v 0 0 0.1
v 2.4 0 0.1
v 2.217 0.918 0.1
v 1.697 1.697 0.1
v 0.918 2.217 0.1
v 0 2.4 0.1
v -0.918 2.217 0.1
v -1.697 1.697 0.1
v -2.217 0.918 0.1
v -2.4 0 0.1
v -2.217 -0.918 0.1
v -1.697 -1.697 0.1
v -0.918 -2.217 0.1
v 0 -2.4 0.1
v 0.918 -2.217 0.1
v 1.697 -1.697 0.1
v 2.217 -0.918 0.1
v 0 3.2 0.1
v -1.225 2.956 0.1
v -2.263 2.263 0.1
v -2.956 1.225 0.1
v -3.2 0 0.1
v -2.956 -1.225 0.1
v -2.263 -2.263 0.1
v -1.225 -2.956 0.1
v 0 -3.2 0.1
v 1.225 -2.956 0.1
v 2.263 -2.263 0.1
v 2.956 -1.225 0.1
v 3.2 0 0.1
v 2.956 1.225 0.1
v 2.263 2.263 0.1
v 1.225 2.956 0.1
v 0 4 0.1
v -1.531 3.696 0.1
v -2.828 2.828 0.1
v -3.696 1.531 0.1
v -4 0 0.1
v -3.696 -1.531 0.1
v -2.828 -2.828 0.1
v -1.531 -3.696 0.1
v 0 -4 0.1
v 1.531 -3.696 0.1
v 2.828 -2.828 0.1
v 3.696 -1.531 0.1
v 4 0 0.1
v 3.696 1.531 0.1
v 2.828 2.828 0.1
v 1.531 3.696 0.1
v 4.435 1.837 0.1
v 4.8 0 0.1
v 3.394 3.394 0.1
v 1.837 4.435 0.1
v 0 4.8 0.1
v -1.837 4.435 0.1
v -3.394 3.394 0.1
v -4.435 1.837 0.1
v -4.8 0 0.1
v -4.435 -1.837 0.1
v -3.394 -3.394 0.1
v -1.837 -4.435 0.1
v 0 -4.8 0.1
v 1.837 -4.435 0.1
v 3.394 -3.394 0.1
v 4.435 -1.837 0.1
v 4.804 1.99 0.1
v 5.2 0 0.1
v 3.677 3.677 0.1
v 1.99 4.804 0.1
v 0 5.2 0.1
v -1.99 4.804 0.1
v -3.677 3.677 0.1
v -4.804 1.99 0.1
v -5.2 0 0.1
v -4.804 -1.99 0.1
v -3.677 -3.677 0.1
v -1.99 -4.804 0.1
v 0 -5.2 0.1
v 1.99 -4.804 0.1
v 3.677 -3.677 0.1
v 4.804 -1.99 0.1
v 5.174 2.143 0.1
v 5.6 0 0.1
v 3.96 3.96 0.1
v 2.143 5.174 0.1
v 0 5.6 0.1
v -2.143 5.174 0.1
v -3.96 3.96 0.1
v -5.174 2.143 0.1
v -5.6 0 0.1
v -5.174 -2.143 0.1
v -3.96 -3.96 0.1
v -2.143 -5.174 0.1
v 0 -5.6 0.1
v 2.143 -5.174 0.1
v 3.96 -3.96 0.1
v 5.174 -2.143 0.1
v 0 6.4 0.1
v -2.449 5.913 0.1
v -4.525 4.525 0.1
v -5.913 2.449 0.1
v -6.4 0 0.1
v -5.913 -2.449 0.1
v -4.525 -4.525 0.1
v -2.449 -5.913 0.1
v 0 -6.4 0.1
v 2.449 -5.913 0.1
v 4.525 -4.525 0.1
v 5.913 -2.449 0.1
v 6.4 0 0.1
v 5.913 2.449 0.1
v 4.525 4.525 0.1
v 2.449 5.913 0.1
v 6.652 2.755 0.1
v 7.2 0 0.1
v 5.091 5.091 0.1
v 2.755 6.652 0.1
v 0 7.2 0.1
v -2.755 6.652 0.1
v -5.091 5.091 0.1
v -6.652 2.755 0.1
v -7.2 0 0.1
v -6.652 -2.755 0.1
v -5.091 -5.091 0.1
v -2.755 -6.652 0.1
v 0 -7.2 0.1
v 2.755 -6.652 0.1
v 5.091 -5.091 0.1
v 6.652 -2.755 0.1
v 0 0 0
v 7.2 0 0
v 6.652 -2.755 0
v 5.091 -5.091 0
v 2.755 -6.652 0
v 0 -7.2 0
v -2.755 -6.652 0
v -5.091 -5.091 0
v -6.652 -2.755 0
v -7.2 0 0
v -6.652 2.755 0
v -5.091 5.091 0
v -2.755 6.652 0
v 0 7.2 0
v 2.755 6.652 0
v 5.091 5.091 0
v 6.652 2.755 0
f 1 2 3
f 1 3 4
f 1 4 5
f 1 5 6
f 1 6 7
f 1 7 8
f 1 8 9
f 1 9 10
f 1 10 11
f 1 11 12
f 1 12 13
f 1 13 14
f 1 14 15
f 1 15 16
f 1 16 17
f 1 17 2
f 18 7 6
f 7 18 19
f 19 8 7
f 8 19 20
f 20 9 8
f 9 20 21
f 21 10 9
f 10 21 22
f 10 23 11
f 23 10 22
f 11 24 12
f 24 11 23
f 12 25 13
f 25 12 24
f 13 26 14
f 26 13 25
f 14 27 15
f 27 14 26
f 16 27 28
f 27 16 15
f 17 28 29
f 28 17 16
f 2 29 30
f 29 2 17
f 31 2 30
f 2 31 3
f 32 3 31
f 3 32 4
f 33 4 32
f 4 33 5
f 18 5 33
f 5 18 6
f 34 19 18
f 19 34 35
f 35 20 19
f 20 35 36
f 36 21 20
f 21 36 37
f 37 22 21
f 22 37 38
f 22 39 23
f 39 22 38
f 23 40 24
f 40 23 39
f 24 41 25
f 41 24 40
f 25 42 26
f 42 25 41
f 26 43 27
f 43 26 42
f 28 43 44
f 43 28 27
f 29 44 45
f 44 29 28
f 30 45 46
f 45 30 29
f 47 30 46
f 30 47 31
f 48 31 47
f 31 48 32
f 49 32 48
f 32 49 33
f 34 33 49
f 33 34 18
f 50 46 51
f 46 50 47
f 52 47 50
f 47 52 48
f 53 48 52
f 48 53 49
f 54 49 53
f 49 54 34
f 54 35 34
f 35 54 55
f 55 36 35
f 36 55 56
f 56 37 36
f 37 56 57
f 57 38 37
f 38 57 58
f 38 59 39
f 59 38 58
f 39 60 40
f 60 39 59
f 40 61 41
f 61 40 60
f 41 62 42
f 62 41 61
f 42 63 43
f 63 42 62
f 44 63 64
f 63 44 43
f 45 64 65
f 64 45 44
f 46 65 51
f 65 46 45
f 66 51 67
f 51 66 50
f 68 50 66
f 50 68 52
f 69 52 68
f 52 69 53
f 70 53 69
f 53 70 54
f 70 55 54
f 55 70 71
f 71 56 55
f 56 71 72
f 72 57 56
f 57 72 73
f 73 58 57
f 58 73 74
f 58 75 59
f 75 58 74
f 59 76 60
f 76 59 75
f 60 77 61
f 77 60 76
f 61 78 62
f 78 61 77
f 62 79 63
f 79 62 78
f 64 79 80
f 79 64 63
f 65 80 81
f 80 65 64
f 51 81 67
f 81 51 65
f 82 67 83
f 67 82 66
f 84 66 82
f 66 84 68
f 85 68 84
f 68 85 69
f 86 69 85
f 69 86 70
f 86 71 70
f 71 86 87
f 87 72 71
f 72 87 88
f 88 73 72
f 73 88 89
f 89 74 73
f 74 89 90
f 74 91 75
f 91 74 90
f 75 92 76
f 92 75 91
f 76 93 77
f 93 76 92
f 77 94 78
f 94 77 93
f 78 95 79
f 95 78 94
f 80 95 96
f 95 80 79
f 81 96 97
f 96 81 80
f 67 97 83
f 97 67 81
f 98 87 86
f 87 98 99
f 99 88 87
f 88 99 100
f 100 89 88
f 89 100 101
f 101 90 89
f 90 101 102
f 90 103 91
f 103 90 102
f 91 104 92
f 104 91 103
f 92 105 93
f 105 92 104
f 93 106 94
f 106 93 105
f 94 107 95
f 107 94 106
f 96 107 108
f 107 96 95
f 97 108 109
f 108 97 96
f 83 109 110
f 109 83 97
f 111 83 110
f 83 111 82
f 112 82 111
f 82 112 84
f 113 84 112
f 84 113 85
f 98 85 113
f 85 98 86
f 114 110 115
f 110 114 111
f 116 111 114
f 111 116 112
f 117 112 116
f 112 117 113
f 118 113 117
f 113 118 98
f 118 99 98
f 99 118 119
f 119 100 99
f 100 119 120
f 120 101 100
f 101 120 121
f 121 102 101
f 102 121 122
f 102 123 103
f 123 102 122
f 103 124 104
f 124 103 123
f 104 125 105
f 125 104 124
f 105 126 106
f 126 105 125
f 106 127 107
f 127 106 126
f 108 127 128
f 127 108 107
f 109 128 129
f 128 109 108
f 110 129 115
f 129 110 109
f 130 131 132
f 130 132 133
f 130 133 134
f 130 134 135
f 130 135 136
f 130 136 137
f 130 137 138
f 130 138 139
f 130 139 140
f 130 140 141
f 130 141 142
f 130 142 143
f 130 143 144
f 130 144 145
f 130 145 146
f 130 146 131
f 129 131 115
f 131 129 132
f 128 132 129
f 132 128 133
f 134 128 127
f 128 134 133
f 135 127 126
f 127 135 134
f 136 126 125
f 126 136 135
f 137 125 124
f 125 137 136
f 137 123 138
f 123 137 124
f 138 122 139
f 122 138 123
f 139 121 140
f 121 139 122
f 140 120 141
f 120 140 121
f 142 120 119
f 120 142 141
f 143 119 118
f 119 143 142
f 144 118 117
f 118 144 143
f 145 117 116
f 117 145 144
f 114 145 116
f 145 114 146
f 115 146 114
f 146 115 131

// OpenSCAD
// file: ../p/4-4cyli.scad
use <../lib.scad>
function ldraw_lib__4_4cyli() = [
// 0 Cylinder 1.0
// 0 Name: 4-4cyli.dat
// 0 Author: James Jessiman
// 0 !LDRAW_ORG Primitive UPDATE 2005-01
// 0 !LICENSE Licensed under CC BY 4.0 : see CAreadme.txt
// 
// 0 BFC CERTIFY CCW
  [0,"BFC","CERTIFY"],
  [0,"BFC","CCW"],
// 
// 0 !HISTORY 1998-12-15 [PTadmin] Official Update 1998-10
// 0 !HISTORY 2002-03-23 [sbliss] Added BFC statement; merged headers from files in distributions LDraw 0.27 and Complete.
// 0 !HISTORY 2002-04-25 [PTadmin] Official Update 2002-02
// 0 !HISTORY 2004-12-14 [guyvivan] BFC CCW
// 0 !HISTORY 2005-12-28 [PTadmin] Official Update 2005-01
// 0 !HISTORY 2007-06-24 [PTadmin] Header formatted for Contributor Agreement
// 0 !HISTORY 2008-07-01 [PTadmin] Official Update 2008-01
// 
// 
// 4 16 1 1 0 0.9239 1 0.3827 0.9239 0 0.3827 1 0 0
  [4,16,1,1,0,0.9239,1,0.3827,0.9239,0,0.3827,1,0,0],
// 5 24 1 0 0 1 1 0 0.9239 0 0.3827 0.9239 0 -0.3827
  [5,24,1,0,0,1,1,0,0.9239,0,0.3827,0.9239,0,-0.3827],
// 4 16 0.9239 1 0.3827 0.7071 1 0.7071 0.7071 0 0.7071 0.9239 0 0.3827
  [4,16,0.9239,1,0.3827,0.7071,1,0.7071,0.7071,0,0.7071,0.9239,0,0.3827],
// 5 24 0.9239 0 0.3827 0.9239 1 0.3827 0.7071 0 0.7071 1 0 0
  [5,24,0.9239,0,0.3827,0.9239,1,0.3827,0.7071,0,0.7071,1,0,0],
// 4 16 0.7071 1 0.7071 0.3827 1 0.9239 0.3827 0 0.9239 0.7071 0 0.7071
  [4,16,0.7071,1,0.7071,0.3827,1,0.9239,0.3827,0,0.9239,0.7071,0,0.7071],
// 5 24 0.7071 0 0.7071 0.7071 1 0.7071 0.3827 0 0.9239 0.9239 0 0.3827
  [5,24,0.7071,0,0.7071,0.7071,1,0.7071,0.3827,0,0.9239,0.9239,0,0.3827],
// 4 16 0.3827 1 0.9239 0 1 1 0 0 1 0.3827 0 0.9239
  [4,16,0.3827,1,0.9239,0,1,1,0,0,1,0.3827,0,0.9239],
// 5 24 0.3827 0 0.9239 0.3827 1 0.9239 0 0 1 0.7071 0 0.7071
  [5,24,0.3827,0,0.9239,0.3827,1,0.9239,0,0,1,0.7071,0,0.7071],
// 4 16 0 1 1 -0.3827 1 0.9239 -0.3827 0 0.9239 0 0 1
  [4,16,0,1,1,-0.3827,1,0.9239,-0.3827,0,0.9239,0,0,1],
// 5 24 0 0 1 0 1 1 -0.3827 0 0.9239 0.3827 0 0.9239
  [5,24,0,0,1,0,1,1,-0.3827,0,0.9239,0.3827,0,0.9239],
// 4 16 -0.3827 1 0.9239 -0.7071 1 0.7071 -0.7071 0 0.7071 -0.3827 0 0.9239
  [4,16,-0.3827,1,0.9239,-0.7071,1,0.7071,-0.7071,0,0.7071,-0.3827,0,0.9239],
// 5 24 -0.3827 0 0.9239 -0.3827 1 0.9239 -0.7071 0 0.7071 0 0 1
  [5,24,-0.3827,0,0.9239,-0.3827,1,0.9239,-0.7071,0,0.7071,0,0,1],
// 4 16 -0.7071 1 0.7071 -0.9239 1 0.3827 -0.9239 0 0.3827 -0.7071 0 0.7071
  [4,16,-0.7071,1,0.7071,-0.9239,1,0.3827,-0.9239,0,0.3827,-0.7071,0,0.7071],
// 5 24 -0.7071 0 0.7071 -0.7071 1 0.7071 -0.9239 0 0.3827 -0.3827 0 0.9239
  [5,24,-0.7071,0,0.7071,-0.7071,1,0.7071,-0.9239,0,0.3827,-0.3827,0,0.9239],
// 4 16 -0.9239 1 0.3827 -1 1 0 -1 0 0 -0.9239 0 0.3827
  [4,16,-0.9239,1,0.3827,-1,1,0,-1,0,0,-0.9239,0,0.3827],
// 5 24 -0.9239 0 0.3827 -0.9239 1 0.3827 -1 0 0 -0.7071 0 0.7071
  [5,24,-0.9239,0,0.3827,-0.9239,1,0.3827,-1,0,0,-0.7071,0,0.7071],
// 4 16 -1 1 0 -0.9239 1 -0.3827 -0.9239 0 -0.3827 -1 0 0
  [4,16,-1,1,0,-0.9239,1,-0.3827,-0.9239,0,-0.3827,-1,0,0],
// 5 24 -1 0 0 -1 1 0 -0.9239 0 -0.3827 -0.9239 0 0.3827
  [5,24,-1,0,0,-1,1,0,-0.9239,0,-0.3827,-0.9239,0,0.3827],
// 4 16 -0.9239 1 -0.3827 -0.7071 1 -0.7071 -0.7071 0 -0.7071 -0.9239 0 -0.3827
  [4,16,-0.9239,1,-0.3827,-0.7071,1,-0.7071,-0.7071,0,-0.7071,-0.9239,0,-0.3827],
// 5 24 -0.9239 0 -0.3827 -0.9239 1 -0.3827 -0.7071 0 -0.7071 -1 0 0
  [5,24,-0.9239,0,-0.3827,-0.9239,1,-0.3827,-0.7071,0,-0.7071,-1,0,0],
// 4 16 -0.7071 1 -0.7071 -0.3827 1 -0.9239 -0.3827 0 -0.9239 -0.7071 0 -0.7071
  [4,16,-0.7071,1,-0.7071,-0.3827,1,-0.9239,-0.3827,0,-0.9239,-0.7071,0,-0.7071],
// 5 24 -0.7071 0 -0.7071 -0.7071 1 -0.7071 -0.3827 0 -0.9239 -0.9239 0 -0.3827
  [5,24,-0.7071,0,-0.7071,-0.7071,1,-0.7071,-0.3827,0,-0.9239,-0.9239,0,-0.3827],
// 4 16 -0.3827 1 -0.9239 0 1 -1 0 0 -1 -0.3827 0 -0.9239
  [4,16,-0.3827,1,-0.9239,0,1,-1,0,0,-1,-0.3827,0,-0.9239],
// 5 24 -0.3827 0 -0.9239 -0.3827 1 -0.9239 0 0 -1 -0.7071 0 -0.7071
  [5,24,-0.3827,0,-0.9239,-0.3827,1,-0.9239,0,0,-1,-0.7071,0,-0.7071],
// 4 16 0 1 -1 0.3827 1 -0.9239 0.3827 0 -0.9239 0 0 -1
  [4,16,0,1,-1,0.3827,1,-0.9239,0.3827,0,-0.9239,0,0,-1],
// 5 24 0 0 -1 0 1 -1 0.3827 0 -0.9239 -0.3827 0 -0.9239
  [5,24,0,0,-1,0,1,-1,0.3827,0,-0.9239,-0.3827,0,-0.9239],
// 4 16 0.3827 1 -0.9239 0.7071 1 -0.7071 0.7071 0 -0.7071 0.3827 0 -0.9239
  [4,16,0.3827,1,-0.9239,0.7071,1,-0.7071,0.7071,0,-0.7071,0.3827,0,-0.9239],
// 5 24 0.3827 0 -0.9239 0.3827 1 -0.9239 0.7071 0 -0.7071 0 0 -1
  [5,24,0.3827,0,-0.9239,0.3827,1,-0.9239,0.7071,0,-0.7071,0,0,-1],
// 4 16 0.7071 1 -0.7071 0.9239 1 -0.3827 0.9239 0 -0.3827 0.7071 0 -0.7071
  [4,16,0.7071,1,-0.7071,0.9239,1,-0.3827,0.9239,0,-0.3827,0.7071,0,-0.7071],
// 5 24 0.7071 0 -0.7071 0.7071 1 -0.7071 0.9239 0 -0.3827 0.3827 0 -0.9239
  [5,24,0.7071,0,-0.7071,0.7071,1,-0.7071,0.9239,0,-0.3827,0.3827,0,-0.9239],
// 4 16 0.9239 1 -0.3827 1 1 0 1 0 0 0.9239 0 -0.3827
  [4,16,0.9239,1,-0.3827,1,1,0,1,0,0,0.9239,0,-0.3827],
// 5 24 0.9239 0 -0.3827 0.9239 1 -0.3827 1 0 0 0.7071 0 -0.7071
  [5,24,0.9239,0,-0.3827,0.9239,1,-0.3827,1,0,0,0.7071,0,-0.7071],
// 0
];
module ldraw_lib__4_4cyli(step=0, col=false, unit=2/5, alt=false, line=0.2, solid=!$preview)
    makepoly(ldraw_lib__4_4cyli(), step=step, col=col, unit=unit, alt=alt, line=line, solid=solid);
ldraw_lib__4_4cyli(line=0.2);
// file: ../p/4-4ring8.scad
use <../lib.scad>
function ldraw_lib__4_4ring8() = [
// 0 Ring  8 x 1.0
// 0 Name: 4-4ring8.dat
// 0 Author: Steffen [Steffen]
// 0 !LDRAW_ORG Primitive UPDATE 2012-01
// 0 !LICENSE Licensed under CC BY 4.0 : see CAreadme.txt
// 
// 0 BFC CERTIFY CCW
  [0,"BFC","CERTIFY"],
  [0,"BFC","CCW"],
// 
// 0 !HISTORY 2003-12-19 [PTadmin] Official Update 2003-03
// 0 !HISTORY 2007-06-24 [PTadmin] Header formatted for Contributor Agreement
// 0 !HISTORY 2008-07-01 [PTadmin] Official Update 2008-01
// 0 !HISTORY 2012-02-16 [Philo] Changed to CCW
// 0 !HISTORY 2012-03-30 [PTadmin] Official Update 2012-01
// 
// 
// 4 16 9 0 0 8.3151 0 3.4443 7.3912 0 3.0616 8 0 0
  [4,16,9,0,0,8.3151,0,3.4443,7.3912,0,3.0616,8,0,0],
// 4 16 8.3151 0 3.4443 6.3639 0 6.3639 5.6568 0 5.6568 7.3912 0 3.0616
  [4,16,8.3151,0,3.4443,6.3639,0,6.3639,5.6568,0,5.6568,7.3912,0,3.0616],
// 4 16 6.3639 0 6.3639 3.4443 0 8.3151 3.0616 0 7.3912 5.6568 0 5.6568
  [4,16,6.3639,0,6.3639,3.4443,0,8.3151,3.0616,0,7.3912,5.6568,0,5.6568],
// 4 16 3.4443 0 8.3151 0 0 9 0 0 8 3.0616 0 7.3912
  [4,16,3.4443,0,8.3151,0,0,9,0,0,8,3.0616,0,7.3912],
// 4 16 0 0 9 -3.4443 0 8.3151 -3.0616 0 7.3912 0 0 8
  [4,16,0,0,9,-3.4443,0,8.3151,-3.0616,0,7.3912,0,0,8],
// 4 16 -3.4443 0 8.3151 -6.3639 0 6.3639 -5.6568 0 5.6568 -3.0616 0 7.3912
  [4,16,-3.4443,0,8.3151,-6.3639,0,6.3639,-5.6568,0,5.6568,-3.0616,0,7.3912],
// 4 16 -6.3639 0 6.3639 -8.3151 0 3.4443 -7.3912 0 3.0616 -5.6568 0 5.6568
  [4,16,-6.3639,0,6.3639,-8.3151,0,3.4443,-7.3912,0,3.0616,-5.6568,0,5.6568],
// 4 16 -8.3151 0 3.4443 -9 0 0 -8 0 0 -7.3912 0 3.0616
  [4,16,-8.3151,0,3.4443,-9,0,0,-8,0,0,-7.3912,0,3.0616],
// 4 16 -9 0 0 -8.3151 0 -3.4443 -7.3912 0 -3.0616 -8 0 0
  [4,16,-9,0,0,-8.3151,0,-3.4443,-7.3912,0,-3.0616,-8,0,0],
// 4 16 -8.3151 0 -3.4443 -6.3639 0 -6.3639 -5.6568 0 -5.6568 -7.3912 0 -3.0616
  [4,16,-8.3151,0,-3.4443,-6.3639,0,-6.3639,-5.6568,0,-5.6568,-7.3912,0,-3.0616],
// 4 16 -6.3639 0 -6.3639 -3.4443 0 -8.3151 -3.0616 0 -7.3912 -5.6568 0 -5.6568
  [4,16,-6.3639,0,-6.3639,-3.4443,0,-8.3151,-3.0616,0,-7.3912,-5.6568,0,-5.6568],
// 4 16 -3.4443 0 -8.3151 0 0 -9 0 0 -8 -3.0616 0 -7.3912
  [4,16,-3.4443,0,-8.3151,0,0,-9,0,0,-8,-3.0616,0,-7.3912],
// 4 16 0 0 -9 3.4443 0 -8.3151 3.0616 0 -7.3912 0 0 -8
  [4,16,0,0,-9,3.4443,0,-8.3151,3.0616,0,-7.3912,0,0,-8],
// 4 16 3.4443 0 -8.3151 6.3639 0 -6.3639 5.6568 0 -5.6568 3.0616 0 -7.3912
  [4,16,3.4443,0,-8.3151,6.3639,0,-6.3639,5.6568,0,-5.6568,3.0616,0,-7.3912],
// 4 16 6.3639 0 -6.3639 8.3151 0 -3.4443 7.3912 0 -3.0616 5.6568 0 -5.6568
  [4,16,6.3639,0,-6.3639,8.3151,0,-3.4443,7.3912,0,-3.0616,5.6568,0,-5.6568],
// 4 16 8.3151 0 -3.4443 9 0 0 8 0 0 7.3912 0 -3.0616
  [4,16,8.3151,0,-3.4443,9,0,0,8,0,0,7.3912,0,-3.0616],
];
module ldraw_lib__4_4ring8(step=0, col=false, unit=2/5, alt=false, line=0.2, solid=!$preview)
    makepoly(ldraw_lib__4_4ring8(), step=step, col=col, unit=unit, alt=alt, line=line, solid=solid);
ldraw_lib__4_4ring8(line=0.2);
// file: ../p/4-4ring7.scad
use <../lib.scad>
function ldraw_lib__4_4ring7() = [
// 0 Ring  7 x 1.0
// 0 Name: 4-4ring7.dat
// 0 Author: James Jessiman
// 0 !LDRAW_ORG Primitive UPDATE 2009-01
// 0 !LICENSE Licensed under CC BY 4.0 : see CAreadme.txt
// 
// 0 BFC CERTIFY CCW
  [0,"BFC","CERTIFY"],
  [0,"BFC","CCW"],
// 
// 0 !HISTORY 1998-12-15 [PTadmin] Official Update 1998-10
// 0 !HISTORY 2002-04-05 [hafhead] Added BFC statement
// 0 !HISTORY 2002-04-25 [PTadmin] Official Update 2002-02
// 0 !HISTORY 2007-06-24 [PTadmin] Header formatted for Contributor Agreement
// 0 !HISTORY 2008-07-01 [PTadmin] Official Update 2008-01
// 0 !HISTORY 2008-08-26 [cwdee] Switch polygon winding and rename
// 0 !HISTORY 2009-05-02 [PTadmin] Official Update 2009-01
// 
// 
// 4 16 -3.0616 0 7.3912 -2.6789 0 6.4673 0 0 7 0 0 8
  [4,16,-3.0616,0,7.3912,-2.6789,0,6.4673,0,0,7,0,0,8],
// 4 16 -5.6568 0 5.6568 -4.9497 0 4.9497 -2.6789 0 6.4673 -3.0616 0 7.3912
  [4,16,-5.6568,0,5.6568,-4.9497,0,4.9497,-2.6789,0,6.4673,-3.0616,0,7.3912],
// 4 16 -7.3912 0 3.0616 -6.4673 0 2.6789 -4.9497 0 4.9497 -5.6568 0 5.6568
  [4,16,-7.3912,0,3.0616,-6.4673,0,2.6789,-4.9497,0,4.9497,-5.6568,0,5.6568],
// 4 16 -8 0 0 -7 0 0 -6.4673 0 2.6789 -7.3912 0 3.0616
  [4,16,-8,0,0,-7,0,0,-6.4673,0,2.6789,-7.3912,0,3.0616],
// 4 16 -7.3912 0 -3.0616 -6.4673 0 -2.6789 -7 0 0 -8 0 0
  [4,16,-7.3912,0,-3.0616,-6.4673,0,-2.6789,-7,0,0,-8,0,0],
// 4 16 -5.6568 0 -5.6568 -4.9497 0 -4.9497 -6.4673 0 -2.6789 -7.3912 0 -3.0616
  [4,16,-5.6568,0,-5.6568,-4.9497,0,-4.9497,-6.4673,0,-2.6789,-7.3912,0,-3.0616],
// 4 16 -3.0616 0 -7.3912 -2.6789 0 -6.4673 -4.9497 0 -4.9497 -5.6568 0 -5.6568
  [4,16,-3.0616,0,-7.3912,-2.6789,0,-6.4673,-4.9497,0,-4.9497,-5.6568,0,-5.6568],
// 4 16 0 0 -8 0 0 -7 -2.6789 0 -6.4673 -3.0616 0 -7.3912
  [4,16,0,0,-8,0,0,-7,-2.6789,0,-6.4673,-3.0616,0,-7.3912],
// 4 16 3.0616 0 -7.3912 2.6789 0 -6.4673 0 0 -7 0 0 -8
  [4,16,3.0616,0,-7.3912,2.6789,0,-6.4673,0,0,-7,0,0,-8],
// 4 16 5.6568 0 -5.6568 4.9497 0 -4.9497 2.6789 0 -6.4673 3.0616 0 -7.3912
  [4,16,5.6568,0,-5.6568,4.9497,0,-4.9497,2.6789,0,-6.4673,3.0616,0,-7.3912],
// 4 16 7.3912 0 -3.0616 6.4673 0 -2.6789 4.9497 0 -4.9497 5.6568 0 -5.6568
  [4,16,7.3912,0,-3.0616,6.4673,0,-2.6789,4.9497,0,-4.9497,5.6568,0,-5.6568],
// 4 16 8 0 0 7 0 0 6.4673 0 -2.6789 7.3912 0 -3.0616
  [4,16,8,0,0,7,0,0,6.4673,0,-2.6789,7.3912,0,-3.0616],
// 4 16 7.3912 0 3.0616 6.4673 0 2.6789 7 0 0 8 0 0
  [4,16,7.3912,0,3.0616,6.4673,0,2.6789,7,0,0,8,0,0],
// 4 16 5.6568 0 5.6568 4.9497 0 4.9497 6.4673 0 2.6789 7.3912 0 3.0616
  [4,16,5.6568,0,5.6568,4.9497,0,4.9497,6.4673,0,2.6789,7.3912,0,3.0616],
// 4 16 3.0616 0 7.3912 2.6789 0 6.4673 4.9497 0 4.9497 5.6568 0 5.6568
  [4,16,3.0616,0,7.3912,2.6789,0,6.4673,4.9497,0,4.9497,5.6568,0,5.6568],
// 4 16 0 0 8 0 0 7 2.6789 0 6.4673 3.0616 0 7.3912
  [4,16,0,0,8,0,0,7,2.6789,0,6.4673,3.0616,0,7.3912],
// 0
];
module ldraw_lib__4_4ring7(step=0, col=false, unit=2/5, alt=false, line=0.2, solid=!$preview)
    makepoly(ldraw_lib__4_4ring7(), step=step, col=col, unit=unit, alt=alt, line=line, solid=solid);
ldraw_lib__4_4ring7(line=0.2);
// file: ../p/4-4ring5.scad
use <../lib.scad>
function ldraw_lib__4_4ring5() = [
// 0 Ring  5 x 1.0
// 0 Name: 4-4ring5.dat
// 0 Author: Mark Kennedy [mkennedy]
// 0 !LDRAW_ORG Primitive UPDATE 2012-01
// 0 !LICENSE Licensed under CC BY 4.0 : see CAreadme.txt
// 
// 0 BFC CERTIFY CCW
  [0,"BFC","CERTIFY"],
  [0,"BFC","CCW"],
// 
// 0 !HISTORY 2001-10-23 [pneaster] resequenced quads, corrected winding.
// 0 !HISTORY 2001-12-29 [pneaster] Added BFC.
// 0 !HISTORY 2002-04-25 [PTadmin] Official Update 2002-02
// 0 !HISTORY 2007-06-24 [PTadmin] Header formatted for Contributor Agreement
// 0 !HISTORY 2008-07-01 [PTadmin] Official Update 2008-01
// 0 !HISTORY 2012-02-16 [Philo] Changed to CCW
// 0 !HISTORY 2012-03-30 [PTadmin] Official Update 2012-01
// 
// 
// 4 16 6 0 0 5.5433 0 2.2961 4.6195 0 1.9135 5 0 0
  [4,16,6,0,0,5.5433,0,2.2961,4.6195,0,1.9135,5,0,0],
// 4 16 5.5433 0 2.2961 4.2426 0 4.2426 3.5355 0 3.5355 4.6195 0 1.9135
  [4,16,5.5433,0,2.2961,4.2426,0,4.2426,3.5355,0,3.5355,4.6195,0,1.9135],
// 4 16 4.2426 0 4.2426 2.2961 0 5.5433 1.9135 0 4.6195 3.5355 0 3.5355
  [4,16,4.2426,0,4.2426,2.2961,0,5.5433,1.9135,0,4.6195,3.5355,0,3.5355],
// 4 16 2.2961 0 5.5433 0 0 6 0 0 5 1.9135 0 4.6195
  [4,16,2.2961,0,5.5433,0,0,6,0,0,5,1.9135,0,4.6195],
// 4 16 0 0 6 -2.2961 0 5.5433 -1.9135 0 4.6195 0 0 5
  [4,16,0,0,6,-2.2961,0,5.5433,-1.9135,0,4.6195,0,0,5],
// 4 16 -2.2961 0 5.5433 -4.2426 0 4.2426 -3.5355 0 3.5355 -1.9135 0 4.6195
  [4,16,-2.2961,0,5.5433,-4.2426,0,4.2426,-3.5355,0,3.5355,-1.9135,0,4.6195],
// 4 16 -4.2426 0 4.2426 -5.5433 0 2.2961 -4.6195 0 1.9135 -3.5355 0 3.5355
  [4,16,-4.2426,0,4.2426,-5.5433,0,2.2961,-4.6195,0,1.9135,-3.5355,0,3.5355],
// 4 16 -5.5433 0 2.2961 -6 0 0 -5 0 0 -4.6195 0 1.9135
  [4,16,-5.5433,0,2.2961,-6,0,0,-5,0,0,-4.6195,0,1.9135],
// 4 16 -6 0 0 -5.5433 0 -2.2961 -4.6195 0 -1.9135 -5 0 0
  [4,16,-6,0,0,-5.5433,0,-2.2961,-4.6195,0,-1.9135,-5,0,0],
// 4 16 -5.5433 0 -2.2961 -4.2426 0 -4.2426 -3.5355 0 -3.5355 -4.6195 0 -1.9135
  [4,16,-5.5433,0,-2.2961,-4.2426,0,-4.2426,-3.5355,0,-3.5355,-4.6195,0,-1.9135],
// 4 16 -4.2426 0 -4.2426 -2.2961 0 -5.5433 -1.9135 0 -4.6195 -3.5355 0 -3.5355
  [4,16,-4.2426,0,-4.2426,-2.2961,0,-5.5433,-1.9135,0,-4.6195,-3.5355,0,-3.5355],
// 4 16 -2.2961 0 -5.5433 0 0 -6 0 0 -5 -1.9135 0 -4.6195
  [4,16,-2.2961,0,-5.5433,0,0,-6,0,0,-5,-1.9135,0,-4.6195],
// 4 16 0 0 -6 2.2961 0 -5.5433 1.9135 0 -4.6195 0 0 -5
  [4,16,0,0,-6,2.2961,0,-5.5433,1.9135,0,-4.6195,0,0,-5],
// 4 16 2.2961 0 -5.5433 4.2426 0 -4.2426 3.5355 0 -3.5355 1.9135 0 -4.6195
  [4,16,2.2961,0,-5.5433,4.2426,0,-4.2426,3.5355,0,-3.5355,1.9135,0,-4.6195],
// 4 16 4.2426 0 -4.2426 5.5433 0 -2.2961 4.6195 0 -1.9135 3.5355 0 -3.5355
  [4,16,4.2426,0,-4.2426,5.5433,0,-2.2961,4.6195,0,-1.9135,3.5355,0,-3.5355],
// 4 16 5.5433 0 -2.2961 6 0 0 5 0 0 4.6195 0 -1.9135
  [4,16,5.5433,0,-2.2961,6,0,0,5,0,0,4.6195,0,-1.9135],
];
module ldraw_lib__4_4ring5(step=0, col=false, unit=2/5, alt=false, line=0.2, solid=!$preview)
    makepoly(ldraw_lib__4_4ring5(), step=step, col=col, unit=unit, alt=alt, line=line, solid=solid);
ldraw_lib__4_4ring5(line=0.2);
// file: ../p/4-4ring4.scad
use <../lib.scad>
function ldraw_lib__4_4ring4() = [
// 0 Ring  4 x 1.0
// 0 Name: 4-4ring4.dat
// 0 Author: James Jessiman
// 0 !LDRAW_ORG Primitive UPDATE 2009-01
// 0 !LICENSE Licensed under CC BY 4.0 : see CAreadme.txt
// 
// 0 BFC CERTIFY CCW
  [0,"BFC","CERTIFY"],
  [0,"BFC","CCW"],
// 
// 0 !HISTORY 1998-12-15 [PTadmin] Official Update 1998-10
// 0 !HISTORY 2002-04-08 [BrickCaster] Modified for BFC compliance
// 0 !HISTORY 2002-04-25 [PTadmin] Official Update 2002-02
// 0 !HISTORY 2007-06-24 [PTadmin] Header formatted for Contributor Agreement
// 0 !HISTORY 2008-07-01 [PTadmin] Official Update 2008-01
// 0 !HISTORY 2008-08-26 [cwdee] Switch polygon winding and rename
// 0 !HISTORY 2009-05-02 [PTadmin] Official Update 2009-01
// 
// 
// 4 16 -1.9135 0 4.6195 -1.5308 0 3.6956 0 0 4 0 0 5
  [4,16,-1.9135,0,4.6195,-1.5308,0,3.6956,0,0,4,0,0,5],
// 4 16 -3.5355 0 3.5355 -2.8284 0 2.8284 -1.5308 0 3.6956 -1.9135 0 4.6195
  [4,16,-3.5355,0,3.5355,-2.8284,0,2.8284,-1.5308,0,3.6956,-1.9135,0,4.6195],
// 4 16 -4.6195 0 1.9135 -3.6956 0 1.5308 -2.8284 0 2.8284 -3.5355 0 3.5355
  [4,16,-4.6195,0,1.9135,-3.6956,0,1.5308,-2.8284,0,2.8284,-3.5355,0,3.5355],
// 4 16 -5 0 0 -4 0 0 -3.6956 0 1.5308 -4.6195 0 1.9135
  [4,16,-5,0,0,-4,0,0,-3.6956,0,1.5308,-4.6195,0,1.9135],
// 4 16 -4.6195 0 -1.9135 -3.6956 0 -1.5308 -4 0 0 -5 0 0
  [4,16,-4.6195,0,-1.9135,-3.6956,0,-1.5308,-4,0,0,-5,0,0],
// 4 16 -3.5355 0 -3.5355 -2.8284 0 -2.8284 -3.6956 0 -1.5308 -4.6195 0 -1.9135
  [4,16,-3.5355,0,-3.5355,-2.8284,0,-2.8284,-3.6956,0,-1.5308,-4.6195,0,-1.9135],
// 4 16 -1.9135 0 -4.6195 -1.5308 0 -3.6956 -2.8284 0 -2.8284 -3.5355 0 -3.5355
  [4,16,-1.9135,0,-4.6195,-1.5308,0,-3.6956,-2.8284,0,-2.8284,-3.5355,0,-3.5355],
// 4 16 0 0 -5 0 0 -4 -1.5308 0 -3.6956 -1.9135 0 -4.6195
  [4,16,0,0,-5,0,0,-4,-1.5308,0,-3.6956,-1.9135,0,-4.6195],
// 4 16 1.9135 0 -4.6195 1.5308 0 -3.6956 0 0 -4 0 0 -5
  [4,16,1.9135,0,-4.6195,1.5308,0,-3.6956,0,0,-4,0,0,-5],
// 4 16 3.5355 0 -3.5355 2.8284 0 -2.8284 1.5308 0 -3.6956 1.9135 0 -4.6195
  [4,16,3.5355,0,-3.5355,2.8284,0,-2.8284,1.5308,0,-3.6956,1.9135,0,-4.6195],
// 4 16 4.6195 0 -1.9135 3.6956 0 -1.5308 2.8284 0 -2.8284 3.5355 0 -3.5355
  [4,16,4.6195,0,-1.9135,3.6956,0,-1.5308,2.8284,0,-2.8284,3.5355,0,-3.5355],
// 4 16 5 0 0 4 0 0 3.6956 0 -1.5308 4.6195 0 -1.9135
  [4,16,5,0,0,4,0,0,3.6956,0,-1.5308,4.6195,0,-1.9135],
// 4 16 4.6195 0 1.9135 3.6956 0 1.5308 4 0 0 5 0 0
  [4,16,4.6195,0,1.9135,3.6956,0,1.5308,4,0,0,5,0,0],
// 4 16 3.5355 0 3.5355 2.8284 0 2.8284 3.6956 0 1.5308 4.6195 0 1.9135
  [4,16,3.5355,0,3.5355,2.8284,0,2.8284,3.6956,0,1.5308,4.6195,0,1.9135],
// 4 16 1.9135 0 4.6195 1.5308 0 3.6956 2.8284 0 2.8284 3.5355 0 3.5355
  [4,16,1.9135,0,4.6195,1.5308,0,3.6956,2.8284,0,2.8284,3.5355,0,3.5355],
// 4 16 0 0 5 0 0 4 1.5308 0 3.6956 1.9135 0 4.6195
  [4,16,0,0,5,0,0,4,1.5308,0,3.6956,1.9135,0,4.6195],
// 0
];
module ldraw_lib__4_4ring4(step=0, col=false, unit=2/5, alt=false, line=0.2, solid=!$preview)
    makepoly(ldraw_lib__4_4ring4(), step=step, col=col, unit=unit, alt=alt, line=line, solid=solid);
ldraw_lib__4_4ring4(line=0.2);
// file: ../p/4-4ring3.scad
use <../lib.scad>
function ldraw_lib__4_4ring3() = [
// 0 Ring  3 x 1.0
// 0 Name: 4-4ring3.dat
// 0 Author: James Jessiman
// 0 !LDRAW_ORG Primitive UPDATE 2009-01
// 0 !LICENSE Licensed under CC BY 4.0 : see CAreadme.txt
// 
// 0 BFC CERTIFY CCW
  [0,"BFC","CERTIFY"],
  [0,"BFC","CCW"],
// 
// 0 !HISTORY 1998-12-15 [PTadmin] Official Update 1998-10
// 0 !HISTORY 2002-04-05 [hafhead] Added BFC statement
// 0 !HISTORY 2002-04-25 [PTadmin] Official Update 2002-02
// 0 !HISTORY 2007-06-24 [PTadmin] Header formatted for Contributor Agreement
// 0 !HISTORY 2008-07-01 [PTadmin] Official Update 2008-01
// 0 !HISTORY 2008-08-26 [cwdee] Switch polygon winding and rename
// 0 !HISTORY 2009-05-02 [PTadmin] Official Update 2009-01
// 
// 
// 4 16 -1.5308 0 3.6956 -1.1481 0 2.7717 0 0 3 0 0 4
  [4,16,-1.5308,0,3.6956,-1.1481,0,2.7717,0,0,3,0,0,4],
// 4 16 -2.8284 0 2.8284 -2.1213 0 2.1213 -1.1481 0 2.7717 -1.5308 0 3.6956
  [4,16,-2.8284,0,2.8284,-2.1213,0,2.1213,-1.1481,0,2.7717,-1.5308,0,3.6956],
// 4 16 -3.6956 0 1.5308 -2.7717 0 1.1481 -2.1213 0 2.1213 -2.8284 0 2.8284
  [4,16,-3.6956,0,1.5308,-2.7717,0,1.1481,-2.1213,0,2.1213,-2.8284,0,2.8284],
// 4 16 -4 0 0 -3 0 0 -2.7717 0 1.1481 -3.6956 0 1.5308
  [4,16,-4,0,0,-3,0,0,-2.7717,0,1.1481,-3.6956,0,1.5308],
// 4 16 -3.6956 0 -1.5308 -2.7717 0 -1.1481 -3 0 0 -4 0 0
  [4,16,-3.6956,0,-1.5308,-2.7717,0,-1.1481,-3,0,0,-4,0,0],
// 4 16 -2.8284 0 -2.8284 -2.1213 0 -2.1213 -2.7717 0 -1.1481 -3.6956 0 -1.5308
  [4,16,-2.8284,0,-2.8284,-2.1213,0,-2.1213,-2.7717,0,-1.1481,-3.6956,0,-1.5308],
// 4 16 -1.5308 0 -3.6956 -1.1481 0 -2.7717 -2.1213 0 -2.1213 -2.8284 0 -2.8284
  [4,16,-1.5308,0,-3.6956,-1.1481,0,-2.7717,-2.1213,0,-2.1213,-2.8284,0,-2.8284],
// 4 16 0 0 -4 0 0 -3 -1.1481 0 -2.7717 -1.5308 0 -3.6956
  [4,16,0,0,-4,0,0,-3,-1.1481,0,-2.7717,-1.5308,0,-3.6956],
// 4 16 1.5308 0 -3.6956 1.1481 0 -2.7717 0 0 -3 0 0 -4
  [4,16,1.5308,0,-3.6956,1.1481,0,-2.7717,0,0,-3,0,0,-4],
// 4 16 2.8284 0 -2.8284 2.1213 0 -2.1213 1.1481 0 -2.7717 1.5308 0 -3.6956
  [4,16,2.8284,0,-2.8284,2.1213,0,-2.1213,1.1481,0,-2.7717,1.5308,0,-3.6956],
// 4 16 3.6956 0 -1.5308 2.7717 0 -1.1481 2.1213 0 -2.1213 2.8284 0 -2.8284
  [4,16,3.6956,0,-1.5308,2.7717,0,-1.1481,2.1213,0,-2.1213,2.8284,0,-2.8284],
// 4 16 4 0 0 3 0 0 2.7717 0 -1.1481 3.6956 0 -1.5308
  [4,16,4,0,0,3,0,0,2.7717,0,-1.1481,3.6956,0,-1.5308],
// 4 16 3.6956 0 1.5308 2.7717 0 1.1481 3 0 0 4 0 0
  [4,16,3.6956,0,1.5308,2.7717,0,1.1481,3,0,0,4,0,0],
// 4 16 2.8284 0 2.8284 2.1213 0 2.1213 2.7717 0 1.1481 3.6956 0 1.5308
  [4,16,2.8284,0,2.8284,2.1213,0,2.1213,2.7717,0,1.1481,3.6956,0,1.5308],
// 4 16 1.5308 0 3.6956 1.1481 0 2.7717 2.1213 0 2.1213 2.8284 0 2.8284
  [4,16,1.5308,0,3.6956,1.1481,0,2.7717,2.1213,0,2.1213,2.8284,0,2.8284],
// 4 16 0 0 4 0 0 3 1.1481 0 2.7717 1.5308 0 3.6956
  [4,16,0,0,4,0,0,3,1.1481,0,2.7717,1.5308,0,3.6956],
// 0
];
module ldraw_lib__4_4ring3(step=0, col=false, unit=2/5, alt=false, line=0.2, solid=!$preview)
    makepoly(ldraw_lib__4_4ring3(), step=step, col=col, unit=unit, alt=alt, line=line, solid=solid);
ldraw_lib__4_4ring3(line=0.2);
// file: ../p/4-4ring13.scad
use <../lib.scad>
function ldraw_lib__4_4ring13() = [
// 0 Ring 13 x  1.0
// 0 Name: 4-4ring13.dat
// 0 Author: Willy Tschager [Holly-Wood]
// 0 !LDRAW_ORG Primitive UPDATE 2024-02
// 0 !LICENSE Licensed under CC BY 4.0 : see CAreadme.txt
// 
// 0 BFC CERTIFY CCW
  [0,"BFC","CERTIFY"],
  [0,"BFC","CCW"],
// 
// 0 !HISTORY 2003-12-19 [PTadmin] Official Update 2003-03
// 0 !HISTORY 2007-06-24 [PTadmin] Header formatted for Contributor Agreement
// 0 !HISTORY 2008-07-01 [PTadmin] Official Update 2008-01
// 0 !HISTORY 2024-01-11 [Holly-Wood] Complete regeneration, original by jriley
// 0 !HISTORY 2024-03-24 [OrionP] Official Update 2024-02
// 
// 4 16 14 0 0 12.9346 0 5.3578 12.0107 0 4.9751 13 0 0
  [4,16,14,0,0,12.9346,0,5.3578,12.0107,0,4.9751,13,0,0],
// 4 16 12.9346 0 5.3578 9.8994 0 9.8994 9.1923 0 9.1923 12.0107 0 4.9751
  [4,16,12.9346,0,5.3578,9.8994,0,9.8994,9.1923,0,9.1923,12.0107,0,4.9751],
// 4 16 9.8994 0 9.8994 5.3578 0 12.9346 4.9751 0 12.0107 9.1923 0 9.1923
  [4,16,9.8994,0,9.8994,5.3578,0,12.9346,4.9751,0,12.0107,9.1923,0,9.1923],
// 4 16 5.3578 0 12.9346 0 0 14 0 0 13 4.9751 0 12.0107
  [4,16,5.3578,0,12.9346,0,0,14,0,0,13,4.9751,0,12.0107],
// 4 16 0 0 14 -5.3578 0 12.9346 -4.9751 0 12.0107 0 0 13
  [4,16,0,0,14,-5.3578,0,12.9346,-4.9751,0,12.0107,0,0,13],
// 4 16 -5.3578 0 12.9346 -9.8994 0 9.8994 -9.1923 0 9.1923 -4.9751 0 12.0107
  [4,16,-5.3578,0,12.9346,-9.8994,0,9.8994,-9.1923,0,9.1923,-4.9751,0,12.0107],
// 4 16 -9.8994 0 9.8994 -12.9346 0 5.3578 -12.0107 0 4.9751 -9.1923 0 9.1923
  [4,16,-9.8994,0,9.8994,-12.9346,0,5.3578,-12.0107,0,4.9751,-9.1923,0,9.1923],
// 4 16 -12.9346 0 5.3578 -14 0 0 -13 0 0 -12.0107 0 4.9751
  [4,16,-12.9346,0,5.3578,-14,0,0,-13,0,0,-12.0107,0,4.9751],
// 4 16 -14 0 0 -12.9346 0 -5.3578 -12.0107 0 -4.9751 -13 0 0
  [4,16,-14,0,0,-12.9346,0,-5.3578,-12.0107,0,-4.9751,-13,0,0],
// 4 16 -12.9346 0 -5.3578 -9.8994 0 -9.8994 -9.1923 0 -9.1923 -12.0107 0 -4.9751
  [4,16,-12.9346,0,-5.3578,-9.8994,0,-9.8994,-9.1923,0,-9.1923,-12.0107,0,-4.9751],
// 4 16 -9.8994 0 -9.8994 -5.3578 0 -12.9346 -4.9751 0 -12.0107 -9.1923 0 -9.1923
  [4,16,-9.8994,0,-9.8994,-5.3578,0,-12.9346,-4.9751,0,-12.0107,-9.1923,0,-9.1923],
// 4 16 -5.3578 0 -12.9346 0 0 -14 0 0 -13 -4.9751 0 -12.0107
  [4,16,-5.3578,0,-12.9346,0,0,-14,0,0,-13,-4.9751,0,-12.0107],
// 4 16 0 0 -14 5.3578 0 -12.9346 4.9751 0 -12.0107 0 0 -13
  [4,16,0,0,-14,5.3578,0,-12.9346,4.9751,0,-12.0107,0,0,-13],
// 4 16 5.3578 0 -12.9346 9.8994 0 -9.8994 9.1923 0 -9.1923 4.9751 0 -12.0107
  [4,16,5.3578,0,-12.9346,9.8994,0,-9.8994,9.1923,0,-9.1923,4.9751,0,-12.0107],
// 4 16 9.8994 0 -9.8994 12.9346 0 -5.3578 12.0107 0 -4.9751 9.1923 0 -9.1923
  [4,16,9.8994,0,-9.8994,12.9346,0,-5.3578,12.0107,0,-4.9751,9.1923,0,-9.1923],
// 4 16 12.9346 0 -5.3578 14 0 0 13 0 0 12.0107 0 -4.9751
  [4,16,12.9346,0,-5.3578,14,0,0,13,0,0,12.0107,0,-4.9751],
// 0 // Build by LDPartEditor (PrimGen 2.X)
];
module ldraw_lib__4_4ring13(step=0, col=false, unit=2/5, alt=false, line=0.2, solid=!$preview)
    makepoly(ldraw_lib__4_4ring13(), step=step, col=col, unit=unit, alt=alt, line=line, solid=solid);
ldraw_lib__4_4ring13(line=0.2);
// file: ../p/4-4ring12.scad
use <../lib.scad>
function ldraw_lib__4_4ring12() = [
// 0 Ring 12 x 1.0
// 0 Name: 4-4ring12.dat
// 0 Author: Willy Tschager [Holly-Wood]
// 0 !LDRAW_ORG Primitive UPDATE 2024-02
// 0 !LICENSE Licensed under CC BY 4.0 : see CAreadme.txt
// 
// 0 BFC CERTIFY CCW
  [0,"BFC","CERTIFY"],
  [0,"BFC","CCW"],
// 
// 0 !HISTORY 2003-12-19 [PTadmin] Official Update 2003-03
// 0 !HISTORY 2007-06-24 [PTadmin] Header formatted for Contributor Agreement
// 0 !HISTORY 2008-07-01 [PTadmin] Official Update 2008-01
// 0 !HISTORY 2024-01-09 [Holly-Wood] Complete regeneration, original by jriley
// 0 !HISTORY 2024-03-24 [OrionP] Official Update 2024-02
// 
// 4 16 13 0 0 12.0107 0 4.9751 11.0868 0 4.5924 12 0 0
  [4,16,13,0,0,12.0107,0,4.9751,11.0868,0,4.5924,12,0,0],
// 4 16 12.0107 0 4.9751 9.1923 0 9.1923 8.4852 0 8.4852 11.0868 0 4.5924
  [4,16,12.0107,0,4.9751,9.1923,0,9.1923,8.4852,0,8.4852,11.0868,0,4.5924],
// 4 16 9.1923 0 9.1923 4.9751 0 12.0107 4.5924 0 11.0868 8.4852 0 8.4852
  [4,16,9.1923,0,9.1923,4.9751,0,12.0107,4.5924,0,11.0868,8.4852,0,8.4852],
// 4 16 4.9751 0 12.0107 0 0 13 0 0 12 4.5924 0 11.0868
  [4,16,4.9751,0,12.0107,0,0,13,0,0,12,4.5924,0,11.0868],
// 4 16 0 0 13 -4.9751 0 12.0107 -4.5924 0 11.0868 0 0 12
  [4,16,0,0,13,-4.9751,0,12.0107,-4.5924,0,11.0868,0,0,12],
// 4 16 -4.9751 0 12.0107 -9.1923 0 9.1923 -8.4852 0 8.4852 -4.5924 0 11.0868
  [4,16,-4.9751,0,12.0107,-9.1923,0,9.1923,-8.4852,0,8.4852,-4.5924,0,11.0868],
// 4 16 -9.1923 0 9.1923 -12.0107 0 4.9751 -11.0868 0 4.5924 -8.4852 0 8.4852
  [4,16,-9.1923,0,9.1923,-12.0107,0,4.9751,-11.0868,0,4.5924,-8.4852,0,8.4852],
// 4 16 -12.0107 0 4.9751 -13 0 0 -12 0 0 -11.0868 0 4.5924
  [4,16,-12.0107,0,4.9751,-13,0,0,-12,0,0,-11.0868,0,4.5924],
// 4 16 -13 0 0 -12.0107 0 -4.9751 -11.0868 0 -4.5924 -12 0 0
  [4,16,-13,0,0,-12.0107,0,-4.9751,-11.0868,0,-4.5924,-12,0,0],
// 4 16 -12.0107 0 -4.9751 -9.1923 0 -9.1923 -8.4852 0 -8.4852 -11.0868 0 -4.5924
  [4,16,-12.0107,0,-4.9751,-9.1923,0,-9.1923,-8.4852,0,-8.4852,-11.0868,0,-4.5924],
// 4 16 -9.1923 0 -9.1923 -4.9751 0 -12.0107 -4.5924 0 -11.0868 -8.4852 0 -8.4852
  [4,16,-9.1923,0,-9.1923,-4.9751,0,-12.0107,-4.5924,0,-11.0868,-8.4852,0,-8.4852],
// 4 16 -4.9751 0 -12.0107 0 0 -13 0 0 -12 -4.5924 0 -11.0868
  [4,16,-4.9751,0,-12.0107,0,0,-13,0,0,-12,-4.5924,0,-11.0868],
// 4 16 0 0 -13 4.9751 0 -12.0107 4.5924 0 -11.0868 0 0 -12
  [4,16,0,0,-13,4.9751,0,-12.0107,4.5924,0,-11.0868,0,0,-12],
// 4 16 4.9751 0 -12.0107 9.1923 0 -9.1923 8.4852 0 -8.4852 4.5924 0 -11.0868
  [4,16,4.9751,0,-12.0107,9.1923,0,-9.1923,8.4852,0,-8.4852,4.5924,0,-11.0868],
// 4 16 9.1923 0 -9.1923 12.0107 0 -4.9751 11.0868 0 -4.5924 8.4852 0 -8.4852
  [4,16,9.1923,0,-9.1923,12.0107,0,-4.9751,11.0868,0,-4.5924,8.4852,0,-8.4852],
// 4 16 12.0107 0 -4.9751 13 0 0 12 0 0 11.0868 0 -4.5924
  [4,16,12.0107,0,-4.9751,13,0,0,12,0,0,11.0868,0,-4.5924],
// 0 // Build by LDPartEditor (PrimGen 2.X)
];
module ldraw_lib__4_4ring12(step=0, col=false, unit=2/5, alt=false, line=0.2, solid=!$preview)
    makepoly(ldraw_lib__4_4ring12(), step=step, col=col, unit=unit, alt=alt, line=line, solid=solid);
ldraw_lib__4_4ring12(line=0.2);
// file: ../p/4-4disc.scad
use <../lib.scad>
function ldraw_lib__4_4disc() = [
// 0 Disc 1.0
// 0 Name: 4-4disc.dat
// 0 Author: James Jessiman
// 0 !LDRAW_ORG Primitive UPDATE 2002-02
// 0 !LICENSE Licensed under CC BY 4.0 : see CAreadme.txt
// 
// 0 BFC CERTIFY CCW
  [0,"BFC","CERTIFY"],
  [0,"BFC","CCW"],
// 
// 0 !HISTORY 1998-12-15 [PTadmin] Official Update 1998-10
// 0 !HISTORY 2002-03-23 [sbliss] Added BFC statement
// 0 !HISTORY 2002-04-25 [PTadmin] Official Update 2002-02
// 0 !HISTORY 2007-06-24 [PTadmin] Header formatted for Contributor Agreement
// 0 !HISTORY 2008-07-01 [PTadmin] Official Update 2008-01
// 
// 
// 3 16 0 0 0 1 0 0 0.9239 0 0.3827
  [3,16,0,0,0,1,0,0,0.9239,0,0.3827],
// 3 16 0 0 0 0.9239 0 0.3827 0.7071 0 0.7071
  [3,16,0,0,0,0.9239,0,0.3827,0.7071,0,0.7071],
// 3 16 0 0 0 0.7071 0 0.7071 0.3827 0 0.9239
  [3,16,0,0,0,0.7071,0,0.7071,0.3827,0,0.9239],
// 3 16 0 0 0 0.3827 0 0.9239 0 0 1
  [3,16,0,0,0,0.3827,0,0.9239,0,0,1],
// 3 16 0 0 0 0 0 1 -0.3827 0 0.9239
  [3,16,0,0,0,0,0,1,-0.3827,0,0.9239],
// 3 16 0 0 0 -0.3827 0 0.9239 -0.7071 0 0.7071
  [3,16,0,0,0,-0.3827,0,0.9239,-0.7071,0,0.7071],
// 3 16 0 0 0 -0.7071 0 0.7071 -0.9239 0 0.3827
  [3,16,0,0,0,-0.7071,0,0.7071,-0.9239,0,0.3827],
// 3 16 0 0 0 -0.9239 0 0.3827 -1 0 -0
  [3,16,0,0,0,-0.9239,0,0.3827,-1,0,-0],
// 3 16 0 0 0 -1 0 -0 -0.9239 0 -0.3827
  [3,16,0,0,0,-1,0,-0,-0.9239,0,-0.3827],
// 3 16 0 0 0 -0.9239 0 -0.3827 -0.7071 0 -0.7071
  [3,16,0,0,0,-0.9239,0,-0.3827,-0.7071,0,-0.7071],
// 3 16 0 0 0 -0.7071 0 -0.7071 -0.3827 0 -0.9239
  [3,16,0,0,0,-0.7071,0,-0.7071,-0.3827,0,-0.9239],
// 3 16 0 0 0 -0.3827 0 -0.9239 0 0 -1
  [3,16,0,0,0,-0.3827,0,-0.9239,0,0,-1],
// 3 16 0 0 0 0 0 -1 0.3827 0 -0.9239
  [3,16,0,0,0,0,0,-1,0.3827,0,-0.9239],
// 3 16 0 0 0 0.3827 0 -0.9239 0.7071 0 -0.7071
  [3,16,0,0,0,0.3827,0,-0.9239,0.7071,0,-0.7071],
// 3 16 0 0 0 0.7071 0 -0.7071 0.9239 0 -0.3827
  [3,16,0,0,0,0.7071,0,-0.7071,0.9239,0,-0.3827],
// 3 16 0 0 0 0.9239 0 -0.3827 1 0 0
  [3,16,0,0,0,0.9239,0,-0.3827,1,0,0],
// 0
];
module ldraw_lib__4_4disc(step=0, col=false, unit=2/5, alt=false, line=0.2, solid=!$preview)
    makepoly(ldraw_lib__4_4disc(), step=step, col=col, unit=unit, alt=alt, line=line, solid=solid);
ldraw_lib__4_4disc(line=0.2);
// file: ../p/4-4cylc3.scad
use <../lib.scad>
use <4-4cyli.scad>
use <4-4disc.scad>
function ldraw_lib__4_4cylc3() = [
// 0 Cylinder Closed 1.0 without Top or Bottom Edge Lines
// 0 Name: 4-4cylc3.dat
// 0 Author: Chris Dee [cwdee]
// 0 !LDRAW_ORG Primitive UPDATE 2017-01
// 0 !LICENSE Licensed under CC BY 4.0 : see CAreadme.txt
// 
// 0 BFC CERTIFY CCW
  [0,"BFC","CERTIFY"],
  [0,"BFC","CCW"],
// 
// 0 !HISTORY 2017-12-30 [PTadmin] Official Update 2017-01
// 
// 
// 1 16 0 0 0 1 0 0 0 1 0 0 0 1 4-4disc.dat
  [1,16,0,0,0,1,0,0,0,1,0,0,0,1, ldraw_lib__4_4disc()],
// 1 16 0 0 0 1 0 0 0 1 0 0 0 1 4-4cyli.dat
  [1,16,0,0,0,1,0,0,0,1,0,0,0,1, ldraw_lib__4_4cyli()],
// 0
];
module ldraw_lib__4_4cylc3(step=0, col=false, unit=2/5, alt=false, line=0.2, solid=!$preview)
    makepoly(ldraw_lib__4_4cylc3(), step=step, col=col, unit=unit, alt=alt, line=line, solid=solid);
ldraw_lib__4_4cylc3(line=0.2);
// main file
use <../lib.scad>
use <../p/4-4cylc3.scad>
use <../p/4-4disc.scad>
use <../p/4-4ring12.scad>
use <../p/4-4ring13.scad>
use <../p/4-4ring3.scad>
use <../p/4-4ring4.scad>
use <../p/4-4ring5.scad>
use <../p/4-4ring7.scad>
use <../p/4-4ring8.scad>
function ldraw_lib__4270894a() = [
// 0 Sticker  1.8 x  1.8 Round with Brown, Yellow, Red Rings
// 0 Name: 4270894a.dat
// 0 Author: Michael Heidemann [mikeheide]
// 0 !LDRAW_ORG Part UPDATE 2024-02
// 0 !LICENSE Licensed under CC BY 4.0 : see CAreadme.txt
// 
// 0 BFC CERTIFY CCW
  [0,"BFC","CERTIFY"],
  [0,"BFC","CCW"],
// 
// 0 !KEYWORDS set 4778
// 
// 0 !HISTORY 2012-08-09 [PTadmin] Official Update 2012-02
// 0 !HISTORY 2016-07-01 [cwdee] Updated description
// 0 !HISTORY 2016-12-31 [PTadmin] Official Update 2016-01
// 0 !HISTORY 2017-07-03 [cwdee] Use cylinder primitive with conditional lines
// 0 !HISTORY 2017-12-30 [PTadmin] Official Update 2017-01
// 0 !HISTORY 2024-03-23 [OrionP] Updated ring primitives
// 0 !HISTORY 2024-03-24 [OrionP] Official Update 2024-02
// 
// 1 6 0 -0.25 0 6 0 0 0 1 0 0 0 6 4-4disc.dat
  [1,6,0,-0.25,0,6,0,0,0,1,0,0,0,6, ldraw_lib__4_4disc()],
// 1 14 0 -0.25 0 2 0 0 0 1 0 0 0 2 4-4ring3.dat
  [1,14,0,-0.25,0,2,0,0,0,1,0,0,0,2, ldraw_lib__4_4ring3()],
// 1 14 0 -0.25 0 2 0 0 0 1 0 0 0 2 4-4ring4.dat
  [1,14,0,-0.25,0,2,0,0,0,1,0,0,0,2, ldraw_lib__4_4ring4()],
// 1 14 0 -0.25 0 2 0 0 0 1 0 0 0 2 4-4ring5.dat
  [1,14,0,-0.25,0,2,0,0,0,1,0,0,0,2, ldraw_lib__4_4ring5()],
// 1 14 0 -0.25 0 1 0 0 0 1 0 0 0 1 4-4ring12.dat
  [1,14,0,-0.25,0,1,0,0,0,1,0,0,0,1, ldraw_lib__4_4ring12()],
// 1 4 0 -0.25 0 1 0 0 0 1 0 0 0 1 4-4ring13.dat
  [1,4,0,-0.25,0,1,0,0,0,1,0,0,0,1, ldraw_lib__4_4ring13()],
// 1 4 0 -0.25 0 2 0 0 0 1 0 0 0 2 4-4ring7.dat
  [1,4,0,-0.25,0,2,0,0,0,1,0,0,0,2, ldraw_lib__4_4ring7()],
// 1 4 0 -0.25 0 2 0 0 0 1 0 0 0 2 4-4ring8.dat
  [1,4,0,-0.25,0,2,0,0,0,1,0,0,0,2, ldraw_lib__4_4ring8()],
// 1 14 0 0 0 18 0 0 0 -0.25 0 0 0 -18 4-4cylc3.dat
  [1,14,0,0,0,18,0,0,0,-0.25,0,0,0,-18, ldraw_lib__4_4cylc3()],
];
module ldraw_lib__4270894a(step=0, col=false, unit=2/5, alt=false, line=0.2, solid=!$preview)
    makepoly(ldraw_lib__4270894a(), step=step, col=col, unit=unit, alt=alt, line=line, solid=solid);
ldraw_lib__4270894a(line=0.2);
